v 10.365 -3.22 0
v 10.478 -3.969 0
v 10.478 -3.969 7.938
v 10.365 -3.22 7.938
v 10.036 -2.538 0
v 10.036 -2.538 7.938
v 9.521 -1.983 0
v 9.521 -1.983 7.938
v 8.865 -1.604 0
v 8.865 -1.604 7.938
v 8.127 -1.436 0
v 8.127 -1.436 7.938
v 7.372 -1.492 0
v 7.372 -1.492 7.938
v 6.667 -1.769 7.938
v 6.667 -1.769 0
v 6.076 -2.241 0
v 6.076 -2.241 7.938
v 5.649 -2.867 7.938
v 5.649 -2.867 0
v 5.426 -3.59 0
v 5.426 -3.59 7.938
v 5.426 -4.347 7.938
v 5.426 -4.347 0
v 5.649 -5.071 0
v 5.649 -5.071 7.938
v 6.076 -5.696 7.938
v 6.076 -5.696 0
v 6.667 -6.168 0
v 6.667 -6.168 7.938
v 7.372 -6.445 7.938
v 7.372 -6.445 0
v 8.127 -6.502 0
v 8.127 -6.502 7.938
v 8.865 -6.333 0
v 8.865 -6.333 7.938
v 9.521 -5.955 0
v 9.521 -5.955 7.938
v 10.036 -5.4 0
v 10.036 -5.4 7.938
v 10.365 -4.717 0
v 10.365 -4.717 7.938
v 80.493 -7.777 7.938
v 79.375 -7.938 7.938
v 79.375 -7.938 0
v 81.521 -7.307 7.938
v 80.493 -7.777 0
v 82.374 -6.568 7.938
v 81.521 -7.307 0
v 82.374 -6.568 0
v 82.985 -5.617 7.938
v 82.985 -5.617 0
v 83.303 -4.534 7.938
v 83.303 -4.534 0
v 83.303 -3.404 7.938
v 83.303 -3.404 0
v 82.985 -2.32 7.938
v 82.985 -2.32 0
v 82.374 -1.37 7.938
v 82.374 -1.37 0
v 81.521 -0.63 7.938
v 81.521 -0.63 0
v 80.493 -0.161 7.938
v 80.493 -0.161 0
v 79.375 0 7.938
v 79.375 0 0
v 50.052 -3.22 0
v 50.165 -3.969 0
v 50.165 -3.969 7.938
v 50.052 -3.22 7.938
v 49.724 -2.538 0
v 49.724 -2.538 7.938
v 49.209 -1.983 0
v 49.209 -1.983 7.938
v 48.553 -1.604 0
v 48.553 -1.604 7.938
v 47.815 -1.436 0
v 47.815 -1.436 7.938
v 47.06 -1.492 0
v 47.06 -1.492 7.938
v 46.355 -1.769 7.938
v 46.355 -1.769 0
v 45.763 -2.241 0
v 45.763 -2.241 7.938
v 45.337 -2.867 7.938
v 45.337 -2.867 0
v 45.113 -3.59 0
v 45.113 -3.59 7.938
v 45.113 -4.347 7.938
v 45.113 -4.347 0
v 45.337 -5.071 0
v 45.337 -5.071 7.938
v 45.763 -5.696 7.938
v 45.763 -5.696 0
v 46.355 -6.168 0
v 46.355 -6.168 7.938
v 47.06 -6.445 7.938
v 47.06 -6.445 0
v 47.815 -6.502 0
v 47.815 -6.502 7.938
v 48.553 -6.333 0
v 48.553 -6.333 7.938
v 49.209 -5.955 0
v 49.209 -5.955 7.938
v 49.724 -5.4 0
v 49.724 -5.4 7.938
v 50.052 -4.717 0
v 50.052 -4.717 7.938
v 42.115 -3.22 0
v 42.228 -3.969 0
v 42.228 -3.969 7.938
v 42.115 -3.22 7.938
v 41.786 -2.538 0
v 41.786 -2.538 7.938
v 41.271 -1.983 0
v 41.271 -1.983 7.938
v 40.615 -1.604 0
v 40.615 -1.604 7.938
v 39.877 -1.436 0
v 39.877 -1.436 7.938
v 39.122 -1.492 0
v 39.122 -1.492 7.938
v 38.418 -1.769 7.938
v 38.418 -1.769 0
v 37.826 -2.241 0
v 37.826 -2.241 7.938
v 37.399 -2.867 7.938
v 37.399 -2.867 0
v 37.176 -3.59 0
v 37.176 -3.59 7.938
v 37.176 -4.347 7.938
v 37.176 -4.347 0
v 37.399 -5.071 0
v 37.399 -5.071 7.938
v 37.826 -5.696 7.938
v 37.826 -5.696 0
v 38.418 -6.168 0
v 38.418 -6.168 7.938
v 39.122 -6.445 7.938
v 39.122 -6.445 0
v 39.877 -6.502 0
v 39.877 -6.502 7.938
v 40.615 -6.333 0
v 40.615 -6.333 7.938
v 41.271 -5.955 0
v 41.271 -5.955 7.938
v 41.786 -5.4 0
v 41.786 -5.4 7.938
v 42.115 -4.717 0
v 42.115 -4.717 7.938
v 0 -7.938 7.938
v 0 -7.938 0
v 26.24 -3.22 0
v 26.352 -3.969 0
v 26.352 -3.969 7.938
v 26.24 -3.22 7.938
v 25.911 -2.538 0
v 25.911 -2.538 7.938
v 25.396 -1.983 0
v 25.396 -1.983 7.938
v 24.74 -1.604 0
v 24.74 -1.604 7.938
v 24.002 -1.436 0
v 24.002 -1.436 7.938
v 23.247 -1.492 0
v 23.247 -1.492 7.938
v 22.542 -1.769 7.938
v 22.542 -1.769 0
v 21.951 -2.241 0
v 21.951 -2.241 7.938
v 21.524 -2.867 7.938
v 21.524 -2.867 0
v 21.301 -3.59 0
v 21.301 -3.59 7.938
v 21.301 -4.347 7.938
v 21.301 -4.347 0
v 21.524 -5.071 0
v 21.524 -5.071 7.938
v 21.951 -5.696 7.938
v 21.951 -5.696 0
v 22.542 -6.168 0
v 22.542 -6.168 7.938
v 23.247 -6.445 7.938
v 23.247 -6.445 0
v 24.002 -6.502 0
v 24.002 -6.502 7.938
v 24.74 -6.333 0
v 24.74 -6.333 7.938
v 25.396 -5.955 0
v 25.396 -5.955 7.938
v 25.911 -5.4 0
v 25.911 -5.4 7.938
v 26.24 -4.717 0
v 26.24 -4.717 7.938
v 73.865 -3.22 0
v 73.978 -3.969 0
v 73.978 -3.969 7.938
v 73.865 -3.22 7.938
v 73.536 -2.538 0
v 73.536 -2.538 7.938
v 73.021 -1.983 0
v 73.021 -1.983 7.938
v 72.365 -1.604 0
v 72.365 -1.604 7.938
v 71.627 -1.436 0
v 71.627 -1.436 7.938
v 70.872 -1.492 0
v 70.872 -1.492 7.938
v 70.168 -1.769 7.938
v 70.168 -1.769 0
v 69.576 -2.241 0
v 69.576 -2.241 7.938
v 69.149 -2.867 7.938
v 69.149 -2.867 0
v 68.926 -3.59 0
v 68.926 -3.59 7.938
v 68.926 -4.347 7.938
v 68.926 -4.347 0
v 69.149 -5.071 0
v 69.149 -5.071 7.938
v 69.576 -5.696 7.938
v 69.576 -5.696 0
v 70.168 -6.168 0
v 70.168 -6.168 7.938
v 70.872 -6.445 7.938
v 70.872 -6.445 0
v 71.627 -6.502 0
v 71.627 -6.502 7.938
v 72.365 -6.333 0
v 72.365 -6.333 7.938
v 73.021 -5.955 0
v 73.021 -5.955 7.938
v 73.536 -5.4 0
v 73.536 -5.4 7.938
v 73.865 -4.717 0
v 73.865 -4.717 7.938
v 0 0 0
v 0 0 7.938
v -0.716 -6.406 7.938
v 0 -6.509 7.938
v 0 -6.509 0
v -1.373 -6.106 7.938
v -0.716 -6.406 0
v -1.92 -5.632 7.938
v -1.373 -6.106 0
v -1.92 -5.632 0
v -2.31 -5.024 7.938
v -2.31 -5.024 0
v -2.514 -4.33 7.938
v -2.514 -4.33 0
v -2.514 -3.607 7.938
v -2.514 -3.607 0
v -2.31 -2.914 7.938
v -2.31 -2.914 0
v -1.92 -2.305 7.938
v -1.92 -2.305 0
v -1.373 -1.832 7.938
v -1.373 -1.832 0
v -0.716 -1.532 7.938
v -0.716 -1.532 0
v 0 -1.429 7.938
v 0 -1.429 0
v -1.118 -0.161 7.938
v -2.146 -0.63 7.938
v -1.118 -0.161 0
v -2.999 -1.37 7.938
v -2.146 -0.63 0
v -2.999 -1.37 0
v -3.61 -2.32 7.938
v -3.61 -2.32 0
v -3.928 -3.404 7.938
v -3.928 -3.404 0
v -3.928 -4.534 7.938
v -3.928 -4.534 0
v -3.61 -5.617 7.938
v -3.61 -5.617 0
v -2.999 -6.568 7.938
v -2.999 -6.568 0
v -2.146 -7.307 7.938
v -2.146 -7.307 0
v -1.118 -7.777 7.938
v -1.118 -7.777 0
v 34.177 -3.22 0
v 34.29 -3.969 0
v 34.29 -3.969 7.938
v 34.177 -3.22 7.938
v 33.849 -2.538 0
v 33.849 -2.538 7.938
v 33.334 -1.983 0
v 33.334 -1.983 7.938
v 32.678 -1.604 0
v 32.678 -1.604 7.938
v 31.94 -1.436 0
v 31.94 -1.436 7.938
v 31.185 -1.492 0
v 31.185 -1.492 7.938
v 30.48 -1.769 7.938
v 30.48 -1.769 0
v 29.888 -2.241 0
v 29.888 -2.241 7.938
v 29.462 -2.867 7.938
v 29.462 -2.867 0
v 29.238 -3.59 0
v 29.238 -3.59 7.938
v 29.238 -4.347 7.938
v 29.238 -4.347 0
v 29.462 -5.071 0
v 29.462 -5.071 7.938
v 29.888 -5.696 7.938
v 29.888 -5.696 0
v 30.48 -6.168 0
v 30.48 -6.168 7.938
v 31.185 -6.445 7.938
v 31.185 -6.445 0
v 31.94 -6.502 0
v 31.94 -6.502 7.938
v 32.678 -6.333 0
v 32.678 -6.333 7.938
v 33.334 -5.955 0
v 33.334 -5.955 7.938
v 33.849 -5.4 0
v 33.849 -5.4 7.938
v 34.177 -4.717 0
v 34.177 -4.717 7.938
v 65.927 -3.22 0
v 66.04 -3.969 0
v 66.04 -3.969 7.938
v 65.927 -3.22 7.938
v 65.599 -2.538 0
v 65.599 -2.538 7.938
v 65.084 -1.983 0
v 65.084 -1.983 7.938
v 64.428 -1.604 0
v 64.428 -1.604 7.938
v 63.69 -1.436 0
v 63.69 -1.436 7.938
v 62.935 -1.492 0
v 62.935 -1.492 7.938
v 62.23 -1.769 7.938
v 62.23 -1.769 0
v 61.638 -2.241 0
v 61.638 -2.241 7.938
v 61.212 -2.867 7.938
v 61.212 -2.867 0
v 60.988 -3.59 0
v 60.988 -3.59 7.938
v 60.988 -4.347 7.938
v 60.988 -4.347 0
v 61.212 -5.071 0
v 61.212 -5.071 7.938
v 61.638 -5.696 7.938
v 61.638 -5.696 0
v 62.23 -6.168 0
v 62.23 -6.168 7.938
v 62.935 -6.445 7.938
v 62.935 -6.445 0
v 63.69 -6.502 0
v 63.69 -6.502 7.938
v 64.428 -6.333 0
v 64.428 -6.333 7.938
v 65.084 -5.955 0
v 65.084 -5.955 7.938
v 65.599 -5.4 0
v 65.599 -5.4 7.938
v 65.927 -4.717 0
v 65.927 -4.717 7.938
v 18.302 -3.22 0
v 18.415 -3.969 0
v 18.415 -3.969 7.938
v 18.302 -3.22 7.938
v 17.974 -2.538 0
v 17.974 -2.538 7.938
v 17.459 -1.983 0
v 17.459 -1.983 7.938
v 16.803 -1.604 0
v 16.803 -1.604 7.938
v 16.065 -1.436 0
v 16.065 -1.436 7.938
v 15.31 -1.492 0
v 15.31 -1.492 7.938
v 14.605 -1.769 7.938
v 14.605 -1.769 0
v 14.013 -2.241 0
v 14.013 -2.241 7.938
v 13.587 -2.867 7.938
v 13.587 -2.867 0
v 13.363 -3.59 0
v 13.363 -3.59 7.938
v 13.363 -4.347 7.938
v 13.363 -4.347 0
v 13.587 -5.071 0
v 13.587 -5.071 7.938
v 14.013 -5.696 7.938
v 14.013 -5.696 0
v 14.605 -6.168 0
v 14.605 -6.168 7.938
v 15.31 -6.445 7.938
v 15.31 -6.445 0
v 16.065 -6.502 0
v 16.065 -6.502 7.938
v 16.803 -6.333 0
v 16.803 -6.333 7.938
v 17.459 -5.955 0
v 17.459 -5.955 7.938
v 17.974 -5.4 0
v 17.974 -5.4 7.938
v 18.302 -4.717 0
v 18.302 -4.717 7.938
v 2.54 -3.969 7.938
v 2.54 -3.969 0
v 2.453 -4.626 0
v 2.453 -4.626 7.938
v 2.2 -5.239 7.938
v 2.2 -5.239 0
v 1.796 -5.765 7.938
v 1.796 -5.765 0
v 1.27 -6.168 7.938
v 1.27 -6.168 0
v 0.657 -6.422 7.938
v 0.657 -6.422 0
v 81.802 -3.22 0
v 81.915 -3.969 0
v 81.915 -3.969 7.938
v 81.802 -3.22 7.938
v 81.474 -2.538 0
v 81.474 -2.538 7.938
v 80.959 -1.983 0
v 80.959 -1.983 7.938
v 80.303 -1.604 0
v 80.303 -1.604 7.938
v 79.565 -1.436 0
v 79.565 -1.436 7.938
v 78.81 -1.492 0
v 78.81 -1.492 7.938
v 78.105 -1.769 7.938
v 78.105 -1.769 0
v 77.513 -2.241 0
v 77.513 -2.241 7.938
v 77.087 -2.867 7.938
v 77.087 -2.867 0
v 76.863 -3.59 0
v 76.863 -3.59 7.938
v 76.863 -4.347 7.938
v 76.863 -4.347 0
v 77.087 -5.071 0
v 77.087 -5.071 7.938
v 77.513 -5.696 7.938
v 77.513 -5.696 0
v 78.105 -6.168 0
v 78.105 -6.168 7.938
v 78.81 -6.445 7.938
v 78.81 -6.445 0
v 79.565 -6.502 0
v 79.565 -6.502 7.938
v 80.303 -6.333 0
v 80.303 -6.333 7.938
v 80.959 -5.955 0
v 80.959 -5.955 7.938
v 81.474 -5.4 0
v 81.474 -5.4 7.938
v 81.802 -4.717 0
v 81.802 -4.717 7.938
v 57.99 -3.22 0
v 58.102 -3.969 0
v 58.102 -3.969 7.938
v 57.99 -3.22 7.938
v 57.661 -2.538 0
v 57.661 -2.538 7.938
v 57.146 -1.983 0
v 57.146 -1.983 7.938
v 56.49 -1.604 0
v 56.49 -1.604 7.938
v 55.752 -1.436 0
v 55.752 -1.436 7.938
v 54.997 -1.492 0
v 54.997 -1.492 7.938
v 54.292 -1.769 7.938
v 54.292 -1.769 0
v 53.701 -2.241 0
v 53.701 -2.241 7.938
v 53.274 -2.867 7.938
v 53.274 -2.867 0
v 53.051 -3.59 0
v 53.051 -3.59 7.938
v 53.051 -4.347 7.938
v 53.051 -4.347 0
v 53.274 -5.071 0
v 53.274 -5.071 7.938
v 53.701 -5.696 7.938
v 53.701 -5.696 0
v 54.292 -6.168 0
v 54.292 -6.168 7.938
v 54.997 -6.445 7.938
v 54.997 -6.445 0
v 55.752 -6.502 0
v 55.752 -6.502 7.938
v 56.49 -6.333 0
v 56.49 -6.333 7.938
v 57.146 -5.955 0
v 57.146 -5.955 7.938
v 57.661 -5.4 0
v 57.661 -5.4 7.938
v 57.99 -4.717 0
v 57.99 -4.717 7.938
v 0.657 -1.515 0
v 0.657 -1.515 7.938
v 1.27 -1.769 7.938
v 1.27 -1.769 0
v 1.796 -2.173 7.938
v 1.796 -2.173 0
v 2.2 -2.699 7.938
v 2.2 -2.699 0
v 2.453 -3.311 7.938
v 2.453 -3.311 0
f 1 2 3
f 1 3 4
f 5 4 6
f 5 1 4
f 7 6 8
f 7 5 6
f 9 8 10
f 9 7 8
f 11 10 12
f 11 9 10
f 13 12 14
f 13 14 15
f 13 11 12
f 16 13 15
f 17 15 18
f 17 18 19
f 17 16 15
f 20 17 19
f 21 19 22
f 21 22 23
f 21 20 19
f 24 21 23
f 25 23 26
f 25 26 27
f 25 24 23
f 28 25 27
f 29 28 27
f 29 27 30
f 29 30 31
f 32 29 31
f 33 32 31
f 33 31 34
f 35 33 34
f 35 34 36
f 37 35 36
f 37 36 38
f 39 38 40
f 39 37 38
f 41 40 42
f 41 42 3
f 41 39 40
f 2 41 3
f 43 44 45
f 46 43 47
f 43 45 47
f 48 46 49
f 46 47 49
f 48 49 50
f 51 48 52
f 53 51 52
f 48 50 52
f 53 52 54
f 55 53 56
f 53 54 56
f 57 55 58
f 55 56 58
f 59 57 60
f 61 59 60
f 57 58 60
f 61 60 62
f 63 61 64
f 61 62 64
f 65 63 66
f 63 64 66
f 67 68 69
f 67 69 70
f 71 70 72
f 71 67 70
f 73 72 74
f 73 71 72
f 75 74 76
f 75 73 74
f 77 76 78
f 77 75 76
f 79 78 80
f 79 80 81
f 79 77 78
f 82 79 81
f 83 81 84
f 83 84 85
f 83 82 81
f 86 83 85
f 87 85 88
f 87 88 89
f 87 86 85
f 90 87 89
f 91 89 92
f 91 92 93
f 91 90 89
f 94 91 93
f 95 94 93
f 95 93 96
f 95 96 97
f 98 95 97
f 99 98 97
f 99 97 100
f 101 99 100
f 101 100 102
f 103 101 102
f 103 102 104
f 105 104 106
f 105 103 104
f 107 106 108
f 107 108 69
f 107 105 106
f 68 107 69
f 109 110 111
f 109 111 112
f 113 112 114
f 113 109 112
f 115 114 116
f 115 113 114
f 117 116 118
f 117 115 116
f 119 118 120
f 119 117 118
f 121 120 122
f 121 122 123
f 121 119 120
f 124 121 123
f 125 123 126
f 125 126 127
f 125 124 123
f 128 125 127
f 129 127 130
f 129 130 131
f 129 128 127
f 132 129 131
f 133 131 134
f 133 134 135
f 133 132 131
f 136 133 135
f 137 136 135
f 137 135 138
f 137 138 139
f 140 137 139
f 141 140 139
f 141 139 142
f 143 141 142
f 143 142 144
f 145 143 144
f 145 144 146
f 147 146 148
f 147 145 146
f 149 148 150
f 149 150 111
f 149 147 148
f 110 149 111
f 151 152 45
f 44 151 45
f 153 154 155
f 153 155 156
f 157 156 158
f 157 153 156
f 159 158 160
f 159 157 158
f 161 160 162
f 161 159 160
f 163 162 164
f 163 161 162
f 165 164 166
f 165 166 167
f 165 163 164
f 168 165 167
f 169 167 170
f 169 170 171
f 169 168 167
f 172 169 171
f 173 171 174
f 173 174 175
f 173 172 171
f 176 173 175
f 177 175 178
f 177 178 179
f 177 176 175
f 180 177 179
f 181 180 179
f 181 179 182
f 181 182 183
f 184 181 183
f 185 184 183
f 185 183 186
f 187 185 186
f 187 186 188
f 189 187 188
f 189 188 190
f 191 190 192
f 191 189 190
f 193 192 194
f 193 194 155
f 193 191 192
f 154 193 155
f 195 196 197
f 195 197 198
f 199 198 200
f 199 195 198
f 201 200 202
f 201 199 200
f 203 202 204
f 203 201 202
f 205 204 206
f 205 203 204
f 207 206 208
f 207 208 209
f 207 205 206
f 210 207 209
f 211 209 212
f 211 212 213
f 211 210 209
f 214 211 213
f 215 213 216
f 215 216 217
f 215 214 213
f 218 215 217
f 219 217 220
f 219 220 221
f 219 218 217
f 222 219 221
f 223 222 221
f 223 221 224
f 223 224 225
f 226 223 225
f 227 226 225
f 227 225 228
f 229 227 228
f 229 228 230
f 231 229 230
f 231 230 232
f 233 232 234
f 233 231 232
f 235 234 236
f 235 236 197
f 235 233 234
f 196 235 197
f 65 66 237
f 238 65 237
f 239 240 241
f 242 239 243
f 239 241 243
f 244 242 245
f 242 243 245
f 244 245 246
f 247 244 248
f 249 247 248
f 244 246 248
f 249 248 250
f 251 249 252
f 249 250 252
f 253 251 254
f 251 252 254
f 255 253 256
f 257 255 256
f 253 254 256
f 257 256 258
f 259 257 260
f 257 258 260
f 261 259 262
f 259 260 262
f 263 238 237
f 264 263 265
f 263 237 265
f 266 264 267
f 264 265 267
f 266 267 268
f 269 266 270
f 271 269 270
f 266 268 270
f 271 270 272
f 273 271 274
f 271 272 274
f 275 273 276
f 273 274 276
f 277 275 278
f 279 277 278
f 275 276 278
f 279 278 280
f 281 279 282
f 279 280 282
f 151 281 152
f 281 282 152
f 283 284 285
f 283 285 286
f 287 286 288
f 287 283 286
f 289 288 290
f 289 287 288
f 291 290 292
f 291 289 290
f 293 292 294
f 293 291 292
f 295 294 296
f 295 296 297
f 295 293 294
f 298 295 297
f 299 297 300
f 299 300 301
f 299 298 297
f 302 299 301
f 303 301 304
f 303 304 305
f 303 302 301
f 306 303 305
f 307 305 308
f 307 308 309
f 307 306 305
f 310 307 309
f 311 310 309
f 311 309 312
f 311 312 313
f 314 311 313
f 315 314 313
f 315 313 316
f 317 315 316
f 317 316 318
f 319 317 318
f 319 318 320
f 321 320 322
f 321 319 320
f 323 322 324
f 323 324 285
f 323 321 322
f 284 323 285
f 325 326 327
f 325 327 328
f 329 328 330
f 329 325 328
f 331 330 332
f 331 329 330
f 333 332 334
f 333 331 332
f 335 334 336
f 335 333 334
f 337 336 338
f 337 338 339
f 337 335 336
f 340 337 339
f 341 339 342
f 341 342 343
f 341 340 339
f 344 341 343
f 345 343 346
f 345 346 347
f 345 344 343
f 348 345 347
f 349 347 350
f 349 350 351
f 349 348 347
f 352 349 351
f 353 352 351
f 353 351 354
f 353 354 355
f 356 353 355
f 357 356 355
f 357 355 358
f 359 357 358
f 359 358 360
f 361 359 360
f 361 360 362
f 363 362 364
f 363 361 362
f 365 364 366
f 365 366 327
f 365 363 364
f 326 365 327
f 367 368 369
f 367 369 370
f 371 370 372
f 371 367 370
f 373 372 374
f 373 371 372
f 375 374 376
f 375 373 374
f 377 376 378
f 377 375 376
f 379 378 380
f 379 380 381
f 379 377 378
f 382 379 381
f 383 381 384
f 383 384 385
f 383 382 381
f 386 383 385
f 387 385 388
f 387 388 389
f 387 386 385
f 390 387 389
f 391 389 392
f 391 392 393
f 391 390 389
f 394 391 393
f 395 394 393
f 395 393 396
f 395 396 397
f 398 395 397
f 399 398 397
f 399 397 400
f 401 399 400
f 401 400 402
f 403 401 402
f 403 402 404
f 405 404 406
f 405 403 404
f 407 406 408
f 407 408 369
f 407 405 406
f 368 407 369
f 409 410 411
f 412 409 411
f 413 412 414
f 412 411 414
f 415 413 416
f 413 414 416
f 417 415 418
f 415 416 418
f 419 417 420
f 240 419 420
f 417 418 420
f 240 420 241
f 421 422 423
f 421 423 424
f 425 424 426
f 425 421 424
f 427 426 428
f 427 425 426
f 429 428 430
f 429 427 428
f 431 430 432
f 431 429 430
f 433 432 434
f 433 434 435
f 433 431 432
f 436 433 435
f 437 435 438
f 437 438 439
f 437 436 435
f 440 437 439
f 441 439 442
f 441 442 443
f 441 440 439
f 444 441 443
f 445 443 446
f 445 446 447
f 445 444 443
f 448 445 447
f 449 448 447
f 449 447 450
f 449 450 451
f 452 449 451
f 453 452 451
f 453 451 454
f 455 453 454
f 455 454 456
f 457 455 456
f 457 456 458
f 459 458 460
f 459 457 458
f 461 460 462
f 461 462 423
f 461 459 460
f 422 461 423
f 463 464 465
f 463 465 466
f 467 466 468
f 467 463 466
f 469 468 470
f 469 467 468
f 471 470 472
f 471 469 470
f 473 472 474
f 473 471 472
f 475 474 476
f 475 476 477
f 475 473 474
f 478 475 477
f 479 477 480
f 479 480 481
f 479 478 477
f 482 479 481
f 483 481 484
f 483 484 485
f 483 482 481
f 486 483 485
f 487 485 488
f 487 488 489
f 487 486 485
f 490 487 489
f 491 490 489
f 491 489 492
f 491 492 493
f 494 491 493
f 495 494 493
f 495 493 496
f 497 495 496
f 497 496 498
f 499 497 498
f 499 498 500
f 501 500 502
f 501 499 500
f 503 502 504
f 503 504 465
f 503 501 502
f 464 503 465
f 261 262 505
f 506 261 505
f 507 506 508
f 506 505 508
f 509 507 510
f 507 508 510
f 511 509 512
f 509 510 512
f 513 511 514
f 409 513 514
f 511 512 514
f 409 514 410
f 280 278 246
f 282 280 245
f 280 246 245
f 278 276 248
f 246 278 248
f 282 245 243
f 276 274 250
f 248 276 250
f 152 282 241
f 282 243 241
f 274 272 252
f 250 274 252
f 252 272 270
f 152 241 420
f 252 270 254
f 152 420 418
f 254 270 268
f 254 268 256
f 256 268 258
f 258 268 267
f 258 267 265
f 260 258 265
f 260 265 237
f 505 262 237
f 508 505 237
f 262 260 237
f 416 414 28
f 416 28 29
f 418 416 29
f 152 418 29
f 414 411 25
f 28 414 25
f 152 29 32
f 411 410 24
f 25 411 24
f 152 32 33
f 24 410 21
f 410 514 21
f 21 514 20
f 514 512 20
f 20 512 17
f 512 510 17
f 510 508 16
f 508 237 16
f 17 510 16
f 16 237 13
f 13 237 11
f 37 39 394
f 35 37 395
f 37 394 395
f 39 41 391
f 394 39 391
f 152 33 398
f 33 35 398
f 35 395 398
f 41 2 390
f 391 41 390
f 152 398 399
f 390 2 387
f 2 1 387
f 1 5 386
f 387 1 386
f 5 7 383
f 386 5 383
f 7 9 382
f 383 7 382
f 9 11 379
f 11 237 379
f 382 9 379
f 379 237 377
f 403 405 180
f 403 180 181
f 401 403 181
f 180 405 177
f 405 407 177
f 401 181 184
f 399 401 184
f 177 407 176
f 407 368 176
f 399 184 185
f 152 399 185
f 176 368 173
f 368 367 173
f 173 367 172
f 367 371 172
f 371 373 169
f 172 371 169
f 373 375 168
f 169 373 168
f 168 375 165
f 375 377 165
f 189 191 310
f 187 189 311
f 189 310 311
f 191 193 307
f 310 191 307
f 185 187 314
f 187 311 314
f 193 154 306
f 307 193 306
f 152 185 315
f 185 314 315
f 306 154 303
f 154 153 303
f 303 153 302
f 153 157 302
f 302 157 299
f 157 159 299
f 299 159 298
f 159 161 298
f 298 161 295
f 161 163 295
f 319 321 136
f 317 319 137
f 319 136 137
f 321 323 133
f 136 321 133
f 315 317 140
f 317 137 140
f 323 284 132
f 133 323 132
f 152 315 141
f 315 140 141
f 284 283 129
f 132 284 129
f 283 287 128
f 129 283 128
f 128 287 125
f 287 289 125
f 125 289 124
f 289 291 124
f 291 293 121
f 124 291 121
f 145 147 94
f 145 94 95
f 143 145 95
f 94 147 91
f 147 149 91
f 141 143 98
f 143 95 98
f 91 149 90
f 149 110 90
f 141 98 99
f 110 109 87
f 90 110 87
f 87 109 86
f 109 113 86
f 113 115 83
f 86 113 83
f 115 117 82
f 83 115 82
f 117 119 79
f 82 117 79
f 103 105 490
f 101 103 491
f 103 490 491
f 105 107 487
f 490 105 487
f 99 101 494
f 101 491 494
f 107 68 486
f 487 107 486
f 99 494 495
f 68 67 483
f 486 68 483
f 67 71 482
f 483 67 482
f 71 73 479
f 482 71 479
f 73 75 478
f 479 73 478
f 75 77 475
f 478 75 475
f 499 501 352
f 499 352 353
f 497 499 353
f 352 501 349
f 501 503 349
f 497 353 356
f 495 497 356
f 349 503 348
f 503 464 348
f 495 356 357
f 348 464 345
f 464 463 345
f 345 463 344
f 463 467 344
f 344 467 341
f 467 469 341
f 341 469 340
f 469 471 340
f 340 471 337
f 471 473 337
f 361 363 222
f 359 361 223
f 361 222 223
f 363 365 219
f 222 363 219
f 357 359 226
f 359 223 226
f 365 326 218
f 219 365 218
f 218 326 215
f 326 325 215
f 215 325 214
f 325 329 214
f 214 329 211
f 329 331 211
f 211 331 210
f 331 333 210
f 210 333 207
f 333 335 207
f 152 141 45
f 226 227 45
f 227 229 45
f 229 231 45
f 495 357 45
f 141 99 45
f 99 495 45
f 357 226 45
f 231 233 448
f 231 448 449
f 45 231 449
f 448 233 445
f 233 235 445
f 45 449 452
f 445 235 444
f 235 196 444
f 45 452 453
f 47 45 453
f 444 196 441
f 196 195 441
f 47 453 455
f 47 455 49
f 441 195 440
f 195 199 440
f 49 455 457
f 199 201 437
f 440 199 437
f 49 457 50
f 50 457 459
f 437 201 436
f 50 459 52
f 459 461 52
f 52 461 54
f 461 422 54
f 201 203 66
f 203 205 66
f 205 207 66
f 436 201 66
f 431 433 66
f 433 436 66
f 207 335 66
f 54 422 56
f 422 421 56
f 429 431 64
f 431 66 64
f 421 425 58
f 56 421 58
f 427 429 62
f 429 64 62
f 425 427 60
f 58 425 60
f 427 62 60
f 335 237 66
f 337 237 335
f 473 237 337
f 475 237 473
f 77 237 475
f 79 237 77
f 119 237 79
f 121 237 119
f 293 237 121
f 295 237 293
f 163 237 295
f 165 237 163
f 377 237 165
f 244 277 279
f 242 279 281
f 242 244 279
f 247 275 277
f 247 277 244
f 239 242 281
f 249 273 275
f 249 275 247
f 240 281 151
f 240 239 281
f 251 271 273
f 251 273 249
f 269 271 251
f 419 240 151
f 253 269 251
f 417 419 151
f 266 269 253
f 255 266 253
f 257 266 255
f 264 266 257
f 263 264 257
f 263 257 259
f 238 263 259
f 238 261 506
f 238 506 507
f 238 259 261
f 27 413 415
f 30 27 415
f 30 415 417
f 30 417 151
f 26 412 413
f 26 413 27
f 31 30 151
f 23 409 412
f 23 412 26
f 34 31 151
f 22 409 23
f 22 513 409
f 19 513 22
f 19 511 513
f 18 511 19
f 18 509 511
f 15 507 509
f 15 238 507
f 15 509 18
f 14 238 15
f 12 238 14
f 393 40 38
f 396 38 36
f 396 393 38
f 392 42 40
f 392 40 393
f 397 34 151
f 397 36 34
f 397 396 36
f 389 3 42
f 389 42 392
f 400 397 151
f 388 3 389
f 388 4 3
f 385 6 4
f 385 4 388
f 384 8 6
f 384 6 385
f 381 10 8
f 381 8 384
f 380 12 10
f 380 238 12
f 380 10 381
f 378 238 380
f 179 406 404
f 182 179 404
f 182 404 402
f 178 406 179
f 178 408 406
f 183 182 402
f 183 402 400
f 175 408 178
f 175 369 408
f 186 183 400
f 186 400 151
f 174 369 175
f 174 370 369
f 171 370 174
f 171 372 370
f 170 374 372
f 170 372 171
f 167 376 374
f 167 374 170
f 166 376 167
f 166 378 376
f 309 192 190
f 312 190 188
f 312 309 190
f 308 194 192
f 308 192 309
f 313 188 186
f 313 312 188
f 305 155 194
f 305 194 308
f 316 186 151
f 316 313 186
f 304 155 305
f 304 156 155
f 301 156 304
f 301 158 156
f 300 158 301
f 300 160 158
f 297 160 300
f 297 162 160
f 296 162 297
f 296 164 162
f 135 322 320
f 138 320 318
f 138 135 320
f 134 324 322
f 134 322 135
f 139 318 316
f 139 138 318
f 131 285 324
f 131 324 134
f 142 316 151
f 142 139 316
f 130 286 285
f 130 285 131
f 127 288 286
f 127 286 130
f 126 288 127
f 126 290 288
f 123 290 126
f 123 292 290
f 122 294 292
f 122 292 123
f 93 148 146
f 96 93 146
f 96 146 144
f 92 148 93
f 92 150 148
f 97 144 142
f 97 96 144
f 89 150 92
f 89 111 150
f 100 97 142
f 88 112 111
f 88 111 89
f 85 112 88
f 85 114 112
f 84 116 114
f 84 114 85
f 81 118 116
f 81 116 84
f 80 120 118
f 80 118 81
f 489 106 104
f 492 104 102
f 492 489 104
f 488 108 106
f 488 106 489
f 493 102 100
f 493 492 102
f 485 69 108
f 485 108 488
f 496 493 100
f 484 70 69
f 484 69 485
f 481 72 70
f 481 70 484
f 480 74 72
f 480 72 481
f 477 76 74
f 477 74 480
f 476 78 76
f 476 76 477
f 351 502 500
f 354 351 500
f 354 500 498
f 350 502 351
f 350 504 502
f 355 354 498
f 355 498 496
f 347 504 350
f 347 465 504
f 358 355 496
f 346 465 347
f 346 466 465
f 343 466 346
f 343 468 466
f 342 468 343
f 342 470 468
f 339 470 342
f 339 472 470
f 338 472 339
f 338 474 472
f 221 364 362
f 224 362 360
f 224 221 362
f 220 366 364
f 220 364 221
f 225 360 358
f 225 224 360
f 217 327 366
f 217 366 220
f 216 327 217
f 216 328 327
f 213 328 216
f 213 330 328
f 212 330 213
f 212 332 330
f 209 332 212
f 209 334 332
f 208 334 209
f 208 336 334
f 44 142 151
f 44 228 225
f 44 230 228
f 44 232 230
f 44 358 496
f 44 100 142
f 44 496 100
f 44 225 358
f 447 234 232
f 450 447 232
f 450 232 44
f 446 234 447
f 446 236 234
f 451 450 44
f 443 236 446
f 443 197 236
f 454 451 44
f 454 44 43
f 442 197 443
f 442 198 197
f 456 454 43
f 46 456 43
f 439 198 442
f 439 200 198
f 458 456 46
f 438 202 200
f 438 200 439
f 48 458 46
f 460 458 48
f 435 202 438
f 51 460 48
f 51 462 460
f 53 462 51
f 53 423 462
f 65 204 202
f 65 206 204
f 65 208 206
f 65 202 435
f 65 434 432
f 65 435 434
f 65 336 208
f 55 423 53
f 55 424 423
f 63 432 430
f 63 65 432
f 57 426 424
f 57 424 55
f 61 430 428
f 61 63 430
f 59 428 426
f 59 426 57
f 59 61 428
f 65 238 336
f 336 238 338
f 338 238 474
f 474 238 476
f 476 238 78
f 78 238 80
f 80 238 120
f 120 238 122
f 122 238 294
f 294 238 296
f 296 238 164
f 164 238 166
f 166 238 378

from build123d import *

# Parameters (mm, degrees)
F0_R     = 2.54
F1_DEPTH = 7.9375


with BuildPart() as f1:
    # F0 (on Top) → F1 (new body)
    with BuildSketch(Plane.XY):
        with BuildLine():
            Line((79.375, 0), (0, 0))
            Line((0, 0), (0, -1.42875))
            ThreePointArc((0, -1.42875), (1.796051, -2.172699), (2.54, -3.96875))
            ThreePointArc((2.54, -3.96875), (1.796051, -5.764801), (0, -6.50875))
            Line((0, -6.50875), (0, -7.9375))
            Line((0, -7.9375), (79.375, -7.9375))
            ThreePointArc((79.375, -7.9375), (83.34375, -3.96875), (79.375, 0))
        make_face()
        with Locations((7.9375, -3.96875)):
            Circle(F0_R, mode=Mode.SUBTRACT)
        with Locations((15.875, -3.96875)):
            Circle(F0_R, mode=Mode.SUBTRACT)
        with Locations((23.8125, -3.96875)):
            Circle(F0_R, mode=Mode.SUBTRACT)
        with Locations((31.75, -3.96875)):
            Circle(F0_R, mode=Mode.SUBTRACT)
        with Locations((39.6875, -3.96875)):
            Circle(F0_R, mode=Mode.SUBTRACT)
        with Locations((47.625, -3.96875)):
            Circle(F0_R, mode=Mode.SUBTRACT)
        with Locations((55.5625, -3.96875)):
            Circle(F0_R, mode=Mode.SUBTRACT)
        with Locations((63.5, -3.96875)):
            Circle(F0_R, mode=Mode.SUBTRACT)
        with Locations((71.4375, -3.96875)):
            Circle(F0_R, mode=Mode.SUBTRACT)
        with Locations((79.375, -3.96875)):
            Circle(F0_R, mode=Mode.SUBTRACT)
        with BuildLine():
            Line((0, -1.42875), (0, 0))
            ThreePointArc((0, 0), (-3.96875, -3.96875), (0, -7.9375))
            Line((0, -7.9375), (0, -6.50875))
            ThreePointArc((0, -6.50875), (-2.54, -3.96875), (0, -1.42875))
        make_face()
    extrude(amount=F1_DEPTH)


solid = f1.part
